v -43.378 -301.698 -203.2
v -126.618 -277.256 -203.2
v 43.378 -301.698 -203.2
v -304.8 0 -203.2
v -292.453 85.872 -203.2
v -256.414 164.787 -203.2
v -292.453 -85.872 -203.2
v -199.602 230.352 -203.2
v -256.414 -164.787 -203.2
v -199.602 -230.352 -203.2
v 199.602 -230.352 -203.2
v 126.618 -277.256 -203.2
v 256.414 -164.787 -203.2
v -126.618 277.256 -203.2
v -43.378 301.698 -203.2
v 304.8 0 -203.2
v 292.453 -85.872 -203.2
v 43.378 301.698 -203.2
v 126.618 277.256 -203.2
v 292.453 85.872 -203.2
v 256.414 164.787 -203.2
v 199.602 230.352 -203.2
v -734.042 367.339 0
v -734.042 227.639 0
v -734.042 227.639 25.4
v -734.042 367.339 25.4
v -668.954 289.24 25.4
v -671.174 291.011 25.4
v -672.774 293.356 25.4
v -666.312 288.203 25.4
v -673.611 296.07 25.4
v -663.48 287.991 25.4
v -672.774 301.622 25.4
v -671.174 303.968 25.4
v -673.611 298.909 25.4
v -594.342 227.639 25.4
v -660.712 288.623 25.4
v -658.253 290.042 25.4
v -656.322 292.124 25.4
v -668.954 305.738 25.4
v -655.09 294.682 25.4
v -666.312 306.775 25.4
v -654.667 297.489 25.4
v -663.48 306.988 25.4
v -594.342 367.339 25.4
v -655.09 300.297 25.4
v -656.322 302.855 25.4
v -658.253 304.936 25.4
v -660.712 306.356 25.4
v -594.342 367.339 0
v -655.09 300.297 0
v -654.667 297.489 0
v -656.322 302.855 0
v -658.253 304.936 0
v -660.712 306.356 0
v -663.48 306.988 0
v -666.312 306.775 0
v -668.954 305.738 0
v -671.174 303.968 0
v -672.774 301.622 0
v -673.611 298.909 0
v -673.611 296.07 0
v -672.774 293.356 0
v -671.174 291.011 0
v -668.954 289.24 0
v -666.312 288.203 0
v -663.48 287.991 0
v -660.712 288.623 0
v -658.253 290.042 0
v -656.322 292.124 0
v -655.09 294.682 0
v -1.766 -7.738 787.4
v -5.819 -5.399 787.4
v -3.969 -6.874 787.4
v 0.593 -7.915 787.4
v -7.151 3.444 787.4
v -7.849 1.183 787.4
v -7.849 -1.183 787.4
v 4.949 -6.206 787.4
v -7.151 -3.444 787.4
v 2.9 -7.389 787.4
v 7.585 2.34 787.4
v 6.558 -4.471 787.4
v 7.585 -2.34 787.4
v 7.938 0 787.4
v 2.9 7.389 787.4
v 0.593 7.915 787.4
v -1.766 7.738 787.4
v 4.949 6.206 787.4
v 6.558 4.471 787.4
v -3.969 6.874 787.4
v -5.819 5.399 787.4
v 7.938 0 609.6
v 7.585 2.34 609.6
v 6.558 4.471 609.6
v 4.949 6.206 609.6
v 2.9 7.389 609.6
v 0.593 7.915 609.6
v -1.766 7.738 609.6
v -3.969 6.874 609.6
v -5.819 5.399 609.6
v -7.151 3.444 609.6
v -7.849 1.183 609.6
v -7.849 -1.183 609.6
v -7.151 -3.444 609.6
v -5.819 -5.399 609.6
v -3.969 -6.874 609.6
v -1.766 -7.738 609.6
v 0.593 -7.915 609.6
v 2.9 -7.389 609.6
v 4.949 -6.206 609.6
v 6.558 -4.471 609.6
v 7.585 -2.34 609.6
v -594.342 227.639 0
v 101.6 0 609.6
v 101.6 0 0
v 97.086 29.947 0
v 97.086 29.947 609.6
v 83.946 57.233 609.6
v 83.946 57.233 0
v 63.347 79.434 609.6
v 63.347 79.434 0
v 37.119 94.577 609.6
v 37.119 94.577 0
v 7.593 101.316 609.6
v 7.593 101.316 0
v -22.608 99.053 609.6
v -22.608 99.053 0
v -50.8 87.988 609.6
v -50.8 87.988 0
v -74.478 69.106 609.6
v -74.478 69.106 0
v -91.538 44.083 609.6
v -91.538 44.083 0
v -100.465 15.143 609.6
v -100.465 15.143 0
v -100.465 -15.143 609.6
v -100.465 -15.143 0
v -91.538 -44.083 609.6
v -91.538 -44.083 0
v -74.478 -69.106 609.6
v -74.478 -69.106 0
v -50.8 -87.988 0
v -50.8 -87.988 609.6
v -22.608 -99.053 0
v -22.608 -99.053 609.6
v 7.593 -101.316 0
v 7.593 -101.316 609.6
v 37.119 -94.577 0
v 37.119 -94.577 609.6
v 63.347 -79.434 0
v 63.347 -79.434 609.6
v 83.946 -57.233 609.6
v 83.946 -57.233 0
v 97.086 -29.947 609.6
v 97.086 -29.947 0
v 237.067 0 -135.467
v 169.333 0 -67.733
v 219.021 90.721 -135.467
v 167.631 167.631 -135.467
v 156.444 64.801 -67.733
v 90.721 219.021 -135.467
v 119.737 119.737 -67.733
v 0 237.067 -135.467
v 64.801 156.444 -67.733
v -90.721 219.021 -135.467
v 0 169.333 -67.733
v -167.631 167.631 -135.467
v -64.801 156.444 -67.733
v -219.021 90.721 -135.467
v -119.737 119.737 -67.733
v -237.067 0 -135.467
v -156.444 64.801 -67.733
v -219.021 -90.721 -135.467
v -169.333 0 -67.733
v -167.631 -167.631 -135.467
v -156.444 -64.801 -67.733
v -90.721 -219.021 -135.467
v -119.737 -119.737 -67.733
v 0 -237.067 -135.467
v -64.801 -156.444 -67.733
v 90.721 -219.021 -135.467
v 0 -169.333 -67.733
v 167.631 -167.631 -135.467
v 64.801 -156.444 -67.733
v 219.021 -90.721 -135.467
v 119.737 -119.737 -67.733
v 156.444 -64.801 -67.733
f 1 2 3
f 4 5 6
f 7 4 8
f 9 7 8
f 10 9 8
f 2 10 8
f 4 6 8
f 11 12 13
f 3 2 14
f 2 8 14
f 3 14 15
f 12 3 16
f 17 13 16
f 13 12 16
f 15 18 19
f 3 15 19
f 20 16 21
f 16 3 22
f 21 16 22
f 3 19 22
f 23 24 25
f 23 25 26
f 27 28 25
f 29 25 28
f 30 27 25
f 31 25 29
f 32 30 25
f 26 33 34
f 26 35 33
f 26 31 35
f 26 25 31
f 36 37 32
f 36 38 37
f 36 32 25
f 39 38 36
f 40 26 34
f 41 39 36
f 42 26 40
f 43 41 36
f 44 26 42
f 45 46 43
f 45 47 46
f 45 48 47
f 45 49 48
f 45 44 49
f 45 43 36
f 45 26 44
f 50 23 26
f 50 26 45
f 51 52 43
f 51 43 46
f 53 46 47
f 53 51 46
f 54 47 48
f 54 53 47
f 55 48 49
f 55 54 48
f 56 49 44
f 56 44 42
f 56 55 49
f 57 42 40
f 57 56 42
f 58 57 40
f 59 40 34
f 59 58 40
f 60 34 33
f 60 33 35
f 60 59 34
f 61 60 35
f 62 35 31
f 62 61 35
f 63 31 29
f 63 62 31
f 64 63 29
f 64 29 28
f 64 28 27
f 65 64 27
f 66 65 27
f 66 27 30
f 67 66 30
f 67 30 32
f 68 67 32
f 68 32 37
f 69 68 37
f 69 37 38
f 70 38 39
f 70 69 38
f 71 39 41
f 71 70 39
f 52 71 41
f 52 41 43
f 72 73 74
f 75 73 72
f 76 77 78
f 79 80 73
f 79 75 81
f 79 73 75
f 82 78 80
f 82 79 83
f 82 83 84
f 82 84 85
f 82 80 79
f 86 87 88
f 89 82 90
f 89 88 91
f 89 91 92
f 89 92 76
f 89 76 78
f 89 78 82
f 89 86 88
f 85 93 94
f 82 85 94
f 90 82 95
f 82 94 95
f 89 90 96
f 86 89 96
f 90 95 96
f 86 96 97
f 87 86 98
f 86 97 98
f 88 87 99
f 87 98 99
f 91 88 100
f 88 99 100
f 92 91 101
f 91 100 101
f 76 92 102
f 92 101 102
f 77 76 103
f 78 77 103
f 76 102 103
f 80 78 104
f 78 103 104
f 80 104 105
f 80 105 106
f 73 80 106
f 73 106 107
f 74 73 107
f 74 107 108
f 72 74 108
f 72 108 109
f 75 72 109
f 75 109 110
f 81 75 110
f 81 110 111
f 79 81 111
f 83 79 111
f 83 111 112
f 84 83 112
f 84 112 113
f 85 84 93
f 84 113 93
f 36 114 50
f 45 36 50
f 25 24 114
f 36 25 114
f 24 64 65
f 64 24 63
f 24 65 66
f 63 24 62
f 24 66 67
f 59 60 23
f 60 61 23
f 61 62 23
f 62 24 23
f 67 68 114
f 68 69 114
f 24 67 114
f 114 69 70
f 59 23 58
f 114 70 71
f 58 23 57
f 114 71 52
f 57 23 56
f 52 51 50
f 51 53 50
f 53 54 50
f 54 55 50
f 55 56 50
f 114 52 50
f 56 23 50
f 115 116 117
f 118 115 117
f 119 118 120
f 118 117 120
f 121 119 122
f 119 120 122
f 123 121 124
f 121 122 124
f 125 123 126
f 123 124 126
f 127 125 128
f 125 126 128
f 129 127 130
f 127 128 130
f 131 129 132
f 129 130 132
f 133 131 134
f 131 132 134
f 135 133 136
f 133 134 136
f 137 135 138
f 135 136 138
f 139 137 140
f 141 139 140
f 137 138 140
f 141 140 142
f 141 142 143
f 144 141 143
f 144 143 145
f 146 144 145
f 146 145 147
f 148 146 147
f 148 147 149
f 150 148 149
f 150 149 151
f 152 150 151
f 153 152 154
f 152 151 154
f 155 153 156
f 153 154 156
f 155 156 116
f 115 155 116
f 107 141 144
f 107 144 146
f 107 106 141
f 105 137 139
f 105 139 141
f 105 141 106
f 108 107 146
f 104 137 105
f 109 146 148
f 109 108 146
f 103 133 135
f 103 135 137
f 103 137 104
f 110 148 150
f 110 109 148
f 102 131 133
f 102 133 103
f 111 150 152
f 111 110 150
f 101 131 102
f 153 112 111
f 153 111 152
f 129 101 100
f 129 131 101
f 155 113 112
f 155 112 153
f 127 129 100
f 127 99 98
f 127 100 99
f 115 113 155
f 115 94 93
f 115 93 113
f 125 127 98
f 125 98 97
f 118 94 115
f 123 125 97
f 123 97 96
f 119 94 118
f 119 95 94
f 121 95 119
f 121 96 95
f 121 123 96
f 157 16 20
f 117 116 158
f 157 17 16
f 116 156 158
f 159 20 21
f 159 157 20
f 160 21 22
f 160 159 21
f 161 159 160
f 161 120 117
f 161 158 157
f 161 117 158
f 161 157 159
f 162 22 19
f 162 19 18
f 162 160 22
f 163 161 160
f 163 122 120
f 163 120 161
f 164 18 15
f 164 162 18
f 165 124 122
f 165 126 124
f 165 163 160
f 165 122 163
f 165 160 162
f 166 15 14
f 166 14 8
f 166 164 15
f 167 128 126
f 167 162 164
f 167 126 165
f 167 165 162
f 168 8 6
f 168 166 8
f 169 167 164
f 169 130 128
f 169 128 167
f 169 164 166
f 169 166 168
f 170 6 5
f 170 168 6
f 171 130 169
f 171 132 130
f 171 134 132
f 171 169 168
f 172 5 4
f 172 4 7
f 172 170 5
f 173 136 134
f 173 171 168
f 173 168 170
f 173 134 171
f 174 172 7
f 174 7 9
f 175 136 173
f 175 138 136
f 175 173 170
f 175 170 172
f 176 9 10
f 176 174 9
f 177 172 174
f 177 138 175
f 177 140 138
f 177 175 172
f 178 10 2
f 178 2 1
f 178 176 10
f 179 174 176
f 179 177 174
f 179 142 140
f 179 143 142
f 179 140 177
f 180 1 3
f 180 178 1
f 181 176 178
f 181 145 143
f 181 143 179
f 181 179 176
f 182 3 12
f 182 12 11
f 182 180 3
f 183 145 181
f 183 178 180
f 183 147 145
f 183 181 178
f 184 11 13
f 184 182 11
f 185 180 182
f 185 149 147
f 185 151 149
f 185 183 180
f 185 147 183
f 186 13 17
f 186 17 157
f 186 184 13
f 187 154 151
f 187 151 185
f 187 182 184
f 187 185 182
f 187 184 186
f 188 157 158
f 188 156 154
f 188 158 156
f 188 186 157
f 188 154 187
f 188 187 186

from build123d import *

# Parameters (mm, degrees)
F0_R      = 101.6
F1_DEPTH  = 609.6
F3_R      = 304.8
F1_FACE_R = 101.6
F5_R      = 7.9375
F6_DEPTH  = 177.8
F7_W      = 139.7
F7_H      = 139.7
F7_R      = 9.525
F8_DEPTH  = 25.4


with BuildPart() as f1:
    # F0 (on Top) → F1 (new body)
    with BuildSketch(Plane.XY):
        Circle(F0_R)
    extrude(amount=F1_DEPTH)

    # F3 (on offset) → F4 section 0
    with BuildSketch(Plane.XY.offset(-203.2)):
        Circle(F3_R)
    # F1_face (on face) → F4 section 1
    with BuildSketch(Plane(origin=(0, 0, 0), x_dir=(1, 0, 0), z_dir=(0, 0, -1))):
        Circle(F1_FACE_R)
    loft()

    # F5 (on face) → F6 (join)
    with BuildSketch(Plane.XY.offset(609.6)):
        Circle(F5_R)
    extrude(amount=F6_DEPTH)


with BuildPart() as f8:
    # F7 (on Top) → F8 (new body)
    with BuildSketch(Plane.XY):
        with Locations((-664.191993, 297.489228)):
            Rectangle(F7_W, F7_H)
        with Locations((-664.191993, 297.489228)):
            Circle(F7_R, mode=Mode.SUBTRACT)
    extrude(amount=F8_DEPTH)


solid = Compound([f1.part, f8.part])
